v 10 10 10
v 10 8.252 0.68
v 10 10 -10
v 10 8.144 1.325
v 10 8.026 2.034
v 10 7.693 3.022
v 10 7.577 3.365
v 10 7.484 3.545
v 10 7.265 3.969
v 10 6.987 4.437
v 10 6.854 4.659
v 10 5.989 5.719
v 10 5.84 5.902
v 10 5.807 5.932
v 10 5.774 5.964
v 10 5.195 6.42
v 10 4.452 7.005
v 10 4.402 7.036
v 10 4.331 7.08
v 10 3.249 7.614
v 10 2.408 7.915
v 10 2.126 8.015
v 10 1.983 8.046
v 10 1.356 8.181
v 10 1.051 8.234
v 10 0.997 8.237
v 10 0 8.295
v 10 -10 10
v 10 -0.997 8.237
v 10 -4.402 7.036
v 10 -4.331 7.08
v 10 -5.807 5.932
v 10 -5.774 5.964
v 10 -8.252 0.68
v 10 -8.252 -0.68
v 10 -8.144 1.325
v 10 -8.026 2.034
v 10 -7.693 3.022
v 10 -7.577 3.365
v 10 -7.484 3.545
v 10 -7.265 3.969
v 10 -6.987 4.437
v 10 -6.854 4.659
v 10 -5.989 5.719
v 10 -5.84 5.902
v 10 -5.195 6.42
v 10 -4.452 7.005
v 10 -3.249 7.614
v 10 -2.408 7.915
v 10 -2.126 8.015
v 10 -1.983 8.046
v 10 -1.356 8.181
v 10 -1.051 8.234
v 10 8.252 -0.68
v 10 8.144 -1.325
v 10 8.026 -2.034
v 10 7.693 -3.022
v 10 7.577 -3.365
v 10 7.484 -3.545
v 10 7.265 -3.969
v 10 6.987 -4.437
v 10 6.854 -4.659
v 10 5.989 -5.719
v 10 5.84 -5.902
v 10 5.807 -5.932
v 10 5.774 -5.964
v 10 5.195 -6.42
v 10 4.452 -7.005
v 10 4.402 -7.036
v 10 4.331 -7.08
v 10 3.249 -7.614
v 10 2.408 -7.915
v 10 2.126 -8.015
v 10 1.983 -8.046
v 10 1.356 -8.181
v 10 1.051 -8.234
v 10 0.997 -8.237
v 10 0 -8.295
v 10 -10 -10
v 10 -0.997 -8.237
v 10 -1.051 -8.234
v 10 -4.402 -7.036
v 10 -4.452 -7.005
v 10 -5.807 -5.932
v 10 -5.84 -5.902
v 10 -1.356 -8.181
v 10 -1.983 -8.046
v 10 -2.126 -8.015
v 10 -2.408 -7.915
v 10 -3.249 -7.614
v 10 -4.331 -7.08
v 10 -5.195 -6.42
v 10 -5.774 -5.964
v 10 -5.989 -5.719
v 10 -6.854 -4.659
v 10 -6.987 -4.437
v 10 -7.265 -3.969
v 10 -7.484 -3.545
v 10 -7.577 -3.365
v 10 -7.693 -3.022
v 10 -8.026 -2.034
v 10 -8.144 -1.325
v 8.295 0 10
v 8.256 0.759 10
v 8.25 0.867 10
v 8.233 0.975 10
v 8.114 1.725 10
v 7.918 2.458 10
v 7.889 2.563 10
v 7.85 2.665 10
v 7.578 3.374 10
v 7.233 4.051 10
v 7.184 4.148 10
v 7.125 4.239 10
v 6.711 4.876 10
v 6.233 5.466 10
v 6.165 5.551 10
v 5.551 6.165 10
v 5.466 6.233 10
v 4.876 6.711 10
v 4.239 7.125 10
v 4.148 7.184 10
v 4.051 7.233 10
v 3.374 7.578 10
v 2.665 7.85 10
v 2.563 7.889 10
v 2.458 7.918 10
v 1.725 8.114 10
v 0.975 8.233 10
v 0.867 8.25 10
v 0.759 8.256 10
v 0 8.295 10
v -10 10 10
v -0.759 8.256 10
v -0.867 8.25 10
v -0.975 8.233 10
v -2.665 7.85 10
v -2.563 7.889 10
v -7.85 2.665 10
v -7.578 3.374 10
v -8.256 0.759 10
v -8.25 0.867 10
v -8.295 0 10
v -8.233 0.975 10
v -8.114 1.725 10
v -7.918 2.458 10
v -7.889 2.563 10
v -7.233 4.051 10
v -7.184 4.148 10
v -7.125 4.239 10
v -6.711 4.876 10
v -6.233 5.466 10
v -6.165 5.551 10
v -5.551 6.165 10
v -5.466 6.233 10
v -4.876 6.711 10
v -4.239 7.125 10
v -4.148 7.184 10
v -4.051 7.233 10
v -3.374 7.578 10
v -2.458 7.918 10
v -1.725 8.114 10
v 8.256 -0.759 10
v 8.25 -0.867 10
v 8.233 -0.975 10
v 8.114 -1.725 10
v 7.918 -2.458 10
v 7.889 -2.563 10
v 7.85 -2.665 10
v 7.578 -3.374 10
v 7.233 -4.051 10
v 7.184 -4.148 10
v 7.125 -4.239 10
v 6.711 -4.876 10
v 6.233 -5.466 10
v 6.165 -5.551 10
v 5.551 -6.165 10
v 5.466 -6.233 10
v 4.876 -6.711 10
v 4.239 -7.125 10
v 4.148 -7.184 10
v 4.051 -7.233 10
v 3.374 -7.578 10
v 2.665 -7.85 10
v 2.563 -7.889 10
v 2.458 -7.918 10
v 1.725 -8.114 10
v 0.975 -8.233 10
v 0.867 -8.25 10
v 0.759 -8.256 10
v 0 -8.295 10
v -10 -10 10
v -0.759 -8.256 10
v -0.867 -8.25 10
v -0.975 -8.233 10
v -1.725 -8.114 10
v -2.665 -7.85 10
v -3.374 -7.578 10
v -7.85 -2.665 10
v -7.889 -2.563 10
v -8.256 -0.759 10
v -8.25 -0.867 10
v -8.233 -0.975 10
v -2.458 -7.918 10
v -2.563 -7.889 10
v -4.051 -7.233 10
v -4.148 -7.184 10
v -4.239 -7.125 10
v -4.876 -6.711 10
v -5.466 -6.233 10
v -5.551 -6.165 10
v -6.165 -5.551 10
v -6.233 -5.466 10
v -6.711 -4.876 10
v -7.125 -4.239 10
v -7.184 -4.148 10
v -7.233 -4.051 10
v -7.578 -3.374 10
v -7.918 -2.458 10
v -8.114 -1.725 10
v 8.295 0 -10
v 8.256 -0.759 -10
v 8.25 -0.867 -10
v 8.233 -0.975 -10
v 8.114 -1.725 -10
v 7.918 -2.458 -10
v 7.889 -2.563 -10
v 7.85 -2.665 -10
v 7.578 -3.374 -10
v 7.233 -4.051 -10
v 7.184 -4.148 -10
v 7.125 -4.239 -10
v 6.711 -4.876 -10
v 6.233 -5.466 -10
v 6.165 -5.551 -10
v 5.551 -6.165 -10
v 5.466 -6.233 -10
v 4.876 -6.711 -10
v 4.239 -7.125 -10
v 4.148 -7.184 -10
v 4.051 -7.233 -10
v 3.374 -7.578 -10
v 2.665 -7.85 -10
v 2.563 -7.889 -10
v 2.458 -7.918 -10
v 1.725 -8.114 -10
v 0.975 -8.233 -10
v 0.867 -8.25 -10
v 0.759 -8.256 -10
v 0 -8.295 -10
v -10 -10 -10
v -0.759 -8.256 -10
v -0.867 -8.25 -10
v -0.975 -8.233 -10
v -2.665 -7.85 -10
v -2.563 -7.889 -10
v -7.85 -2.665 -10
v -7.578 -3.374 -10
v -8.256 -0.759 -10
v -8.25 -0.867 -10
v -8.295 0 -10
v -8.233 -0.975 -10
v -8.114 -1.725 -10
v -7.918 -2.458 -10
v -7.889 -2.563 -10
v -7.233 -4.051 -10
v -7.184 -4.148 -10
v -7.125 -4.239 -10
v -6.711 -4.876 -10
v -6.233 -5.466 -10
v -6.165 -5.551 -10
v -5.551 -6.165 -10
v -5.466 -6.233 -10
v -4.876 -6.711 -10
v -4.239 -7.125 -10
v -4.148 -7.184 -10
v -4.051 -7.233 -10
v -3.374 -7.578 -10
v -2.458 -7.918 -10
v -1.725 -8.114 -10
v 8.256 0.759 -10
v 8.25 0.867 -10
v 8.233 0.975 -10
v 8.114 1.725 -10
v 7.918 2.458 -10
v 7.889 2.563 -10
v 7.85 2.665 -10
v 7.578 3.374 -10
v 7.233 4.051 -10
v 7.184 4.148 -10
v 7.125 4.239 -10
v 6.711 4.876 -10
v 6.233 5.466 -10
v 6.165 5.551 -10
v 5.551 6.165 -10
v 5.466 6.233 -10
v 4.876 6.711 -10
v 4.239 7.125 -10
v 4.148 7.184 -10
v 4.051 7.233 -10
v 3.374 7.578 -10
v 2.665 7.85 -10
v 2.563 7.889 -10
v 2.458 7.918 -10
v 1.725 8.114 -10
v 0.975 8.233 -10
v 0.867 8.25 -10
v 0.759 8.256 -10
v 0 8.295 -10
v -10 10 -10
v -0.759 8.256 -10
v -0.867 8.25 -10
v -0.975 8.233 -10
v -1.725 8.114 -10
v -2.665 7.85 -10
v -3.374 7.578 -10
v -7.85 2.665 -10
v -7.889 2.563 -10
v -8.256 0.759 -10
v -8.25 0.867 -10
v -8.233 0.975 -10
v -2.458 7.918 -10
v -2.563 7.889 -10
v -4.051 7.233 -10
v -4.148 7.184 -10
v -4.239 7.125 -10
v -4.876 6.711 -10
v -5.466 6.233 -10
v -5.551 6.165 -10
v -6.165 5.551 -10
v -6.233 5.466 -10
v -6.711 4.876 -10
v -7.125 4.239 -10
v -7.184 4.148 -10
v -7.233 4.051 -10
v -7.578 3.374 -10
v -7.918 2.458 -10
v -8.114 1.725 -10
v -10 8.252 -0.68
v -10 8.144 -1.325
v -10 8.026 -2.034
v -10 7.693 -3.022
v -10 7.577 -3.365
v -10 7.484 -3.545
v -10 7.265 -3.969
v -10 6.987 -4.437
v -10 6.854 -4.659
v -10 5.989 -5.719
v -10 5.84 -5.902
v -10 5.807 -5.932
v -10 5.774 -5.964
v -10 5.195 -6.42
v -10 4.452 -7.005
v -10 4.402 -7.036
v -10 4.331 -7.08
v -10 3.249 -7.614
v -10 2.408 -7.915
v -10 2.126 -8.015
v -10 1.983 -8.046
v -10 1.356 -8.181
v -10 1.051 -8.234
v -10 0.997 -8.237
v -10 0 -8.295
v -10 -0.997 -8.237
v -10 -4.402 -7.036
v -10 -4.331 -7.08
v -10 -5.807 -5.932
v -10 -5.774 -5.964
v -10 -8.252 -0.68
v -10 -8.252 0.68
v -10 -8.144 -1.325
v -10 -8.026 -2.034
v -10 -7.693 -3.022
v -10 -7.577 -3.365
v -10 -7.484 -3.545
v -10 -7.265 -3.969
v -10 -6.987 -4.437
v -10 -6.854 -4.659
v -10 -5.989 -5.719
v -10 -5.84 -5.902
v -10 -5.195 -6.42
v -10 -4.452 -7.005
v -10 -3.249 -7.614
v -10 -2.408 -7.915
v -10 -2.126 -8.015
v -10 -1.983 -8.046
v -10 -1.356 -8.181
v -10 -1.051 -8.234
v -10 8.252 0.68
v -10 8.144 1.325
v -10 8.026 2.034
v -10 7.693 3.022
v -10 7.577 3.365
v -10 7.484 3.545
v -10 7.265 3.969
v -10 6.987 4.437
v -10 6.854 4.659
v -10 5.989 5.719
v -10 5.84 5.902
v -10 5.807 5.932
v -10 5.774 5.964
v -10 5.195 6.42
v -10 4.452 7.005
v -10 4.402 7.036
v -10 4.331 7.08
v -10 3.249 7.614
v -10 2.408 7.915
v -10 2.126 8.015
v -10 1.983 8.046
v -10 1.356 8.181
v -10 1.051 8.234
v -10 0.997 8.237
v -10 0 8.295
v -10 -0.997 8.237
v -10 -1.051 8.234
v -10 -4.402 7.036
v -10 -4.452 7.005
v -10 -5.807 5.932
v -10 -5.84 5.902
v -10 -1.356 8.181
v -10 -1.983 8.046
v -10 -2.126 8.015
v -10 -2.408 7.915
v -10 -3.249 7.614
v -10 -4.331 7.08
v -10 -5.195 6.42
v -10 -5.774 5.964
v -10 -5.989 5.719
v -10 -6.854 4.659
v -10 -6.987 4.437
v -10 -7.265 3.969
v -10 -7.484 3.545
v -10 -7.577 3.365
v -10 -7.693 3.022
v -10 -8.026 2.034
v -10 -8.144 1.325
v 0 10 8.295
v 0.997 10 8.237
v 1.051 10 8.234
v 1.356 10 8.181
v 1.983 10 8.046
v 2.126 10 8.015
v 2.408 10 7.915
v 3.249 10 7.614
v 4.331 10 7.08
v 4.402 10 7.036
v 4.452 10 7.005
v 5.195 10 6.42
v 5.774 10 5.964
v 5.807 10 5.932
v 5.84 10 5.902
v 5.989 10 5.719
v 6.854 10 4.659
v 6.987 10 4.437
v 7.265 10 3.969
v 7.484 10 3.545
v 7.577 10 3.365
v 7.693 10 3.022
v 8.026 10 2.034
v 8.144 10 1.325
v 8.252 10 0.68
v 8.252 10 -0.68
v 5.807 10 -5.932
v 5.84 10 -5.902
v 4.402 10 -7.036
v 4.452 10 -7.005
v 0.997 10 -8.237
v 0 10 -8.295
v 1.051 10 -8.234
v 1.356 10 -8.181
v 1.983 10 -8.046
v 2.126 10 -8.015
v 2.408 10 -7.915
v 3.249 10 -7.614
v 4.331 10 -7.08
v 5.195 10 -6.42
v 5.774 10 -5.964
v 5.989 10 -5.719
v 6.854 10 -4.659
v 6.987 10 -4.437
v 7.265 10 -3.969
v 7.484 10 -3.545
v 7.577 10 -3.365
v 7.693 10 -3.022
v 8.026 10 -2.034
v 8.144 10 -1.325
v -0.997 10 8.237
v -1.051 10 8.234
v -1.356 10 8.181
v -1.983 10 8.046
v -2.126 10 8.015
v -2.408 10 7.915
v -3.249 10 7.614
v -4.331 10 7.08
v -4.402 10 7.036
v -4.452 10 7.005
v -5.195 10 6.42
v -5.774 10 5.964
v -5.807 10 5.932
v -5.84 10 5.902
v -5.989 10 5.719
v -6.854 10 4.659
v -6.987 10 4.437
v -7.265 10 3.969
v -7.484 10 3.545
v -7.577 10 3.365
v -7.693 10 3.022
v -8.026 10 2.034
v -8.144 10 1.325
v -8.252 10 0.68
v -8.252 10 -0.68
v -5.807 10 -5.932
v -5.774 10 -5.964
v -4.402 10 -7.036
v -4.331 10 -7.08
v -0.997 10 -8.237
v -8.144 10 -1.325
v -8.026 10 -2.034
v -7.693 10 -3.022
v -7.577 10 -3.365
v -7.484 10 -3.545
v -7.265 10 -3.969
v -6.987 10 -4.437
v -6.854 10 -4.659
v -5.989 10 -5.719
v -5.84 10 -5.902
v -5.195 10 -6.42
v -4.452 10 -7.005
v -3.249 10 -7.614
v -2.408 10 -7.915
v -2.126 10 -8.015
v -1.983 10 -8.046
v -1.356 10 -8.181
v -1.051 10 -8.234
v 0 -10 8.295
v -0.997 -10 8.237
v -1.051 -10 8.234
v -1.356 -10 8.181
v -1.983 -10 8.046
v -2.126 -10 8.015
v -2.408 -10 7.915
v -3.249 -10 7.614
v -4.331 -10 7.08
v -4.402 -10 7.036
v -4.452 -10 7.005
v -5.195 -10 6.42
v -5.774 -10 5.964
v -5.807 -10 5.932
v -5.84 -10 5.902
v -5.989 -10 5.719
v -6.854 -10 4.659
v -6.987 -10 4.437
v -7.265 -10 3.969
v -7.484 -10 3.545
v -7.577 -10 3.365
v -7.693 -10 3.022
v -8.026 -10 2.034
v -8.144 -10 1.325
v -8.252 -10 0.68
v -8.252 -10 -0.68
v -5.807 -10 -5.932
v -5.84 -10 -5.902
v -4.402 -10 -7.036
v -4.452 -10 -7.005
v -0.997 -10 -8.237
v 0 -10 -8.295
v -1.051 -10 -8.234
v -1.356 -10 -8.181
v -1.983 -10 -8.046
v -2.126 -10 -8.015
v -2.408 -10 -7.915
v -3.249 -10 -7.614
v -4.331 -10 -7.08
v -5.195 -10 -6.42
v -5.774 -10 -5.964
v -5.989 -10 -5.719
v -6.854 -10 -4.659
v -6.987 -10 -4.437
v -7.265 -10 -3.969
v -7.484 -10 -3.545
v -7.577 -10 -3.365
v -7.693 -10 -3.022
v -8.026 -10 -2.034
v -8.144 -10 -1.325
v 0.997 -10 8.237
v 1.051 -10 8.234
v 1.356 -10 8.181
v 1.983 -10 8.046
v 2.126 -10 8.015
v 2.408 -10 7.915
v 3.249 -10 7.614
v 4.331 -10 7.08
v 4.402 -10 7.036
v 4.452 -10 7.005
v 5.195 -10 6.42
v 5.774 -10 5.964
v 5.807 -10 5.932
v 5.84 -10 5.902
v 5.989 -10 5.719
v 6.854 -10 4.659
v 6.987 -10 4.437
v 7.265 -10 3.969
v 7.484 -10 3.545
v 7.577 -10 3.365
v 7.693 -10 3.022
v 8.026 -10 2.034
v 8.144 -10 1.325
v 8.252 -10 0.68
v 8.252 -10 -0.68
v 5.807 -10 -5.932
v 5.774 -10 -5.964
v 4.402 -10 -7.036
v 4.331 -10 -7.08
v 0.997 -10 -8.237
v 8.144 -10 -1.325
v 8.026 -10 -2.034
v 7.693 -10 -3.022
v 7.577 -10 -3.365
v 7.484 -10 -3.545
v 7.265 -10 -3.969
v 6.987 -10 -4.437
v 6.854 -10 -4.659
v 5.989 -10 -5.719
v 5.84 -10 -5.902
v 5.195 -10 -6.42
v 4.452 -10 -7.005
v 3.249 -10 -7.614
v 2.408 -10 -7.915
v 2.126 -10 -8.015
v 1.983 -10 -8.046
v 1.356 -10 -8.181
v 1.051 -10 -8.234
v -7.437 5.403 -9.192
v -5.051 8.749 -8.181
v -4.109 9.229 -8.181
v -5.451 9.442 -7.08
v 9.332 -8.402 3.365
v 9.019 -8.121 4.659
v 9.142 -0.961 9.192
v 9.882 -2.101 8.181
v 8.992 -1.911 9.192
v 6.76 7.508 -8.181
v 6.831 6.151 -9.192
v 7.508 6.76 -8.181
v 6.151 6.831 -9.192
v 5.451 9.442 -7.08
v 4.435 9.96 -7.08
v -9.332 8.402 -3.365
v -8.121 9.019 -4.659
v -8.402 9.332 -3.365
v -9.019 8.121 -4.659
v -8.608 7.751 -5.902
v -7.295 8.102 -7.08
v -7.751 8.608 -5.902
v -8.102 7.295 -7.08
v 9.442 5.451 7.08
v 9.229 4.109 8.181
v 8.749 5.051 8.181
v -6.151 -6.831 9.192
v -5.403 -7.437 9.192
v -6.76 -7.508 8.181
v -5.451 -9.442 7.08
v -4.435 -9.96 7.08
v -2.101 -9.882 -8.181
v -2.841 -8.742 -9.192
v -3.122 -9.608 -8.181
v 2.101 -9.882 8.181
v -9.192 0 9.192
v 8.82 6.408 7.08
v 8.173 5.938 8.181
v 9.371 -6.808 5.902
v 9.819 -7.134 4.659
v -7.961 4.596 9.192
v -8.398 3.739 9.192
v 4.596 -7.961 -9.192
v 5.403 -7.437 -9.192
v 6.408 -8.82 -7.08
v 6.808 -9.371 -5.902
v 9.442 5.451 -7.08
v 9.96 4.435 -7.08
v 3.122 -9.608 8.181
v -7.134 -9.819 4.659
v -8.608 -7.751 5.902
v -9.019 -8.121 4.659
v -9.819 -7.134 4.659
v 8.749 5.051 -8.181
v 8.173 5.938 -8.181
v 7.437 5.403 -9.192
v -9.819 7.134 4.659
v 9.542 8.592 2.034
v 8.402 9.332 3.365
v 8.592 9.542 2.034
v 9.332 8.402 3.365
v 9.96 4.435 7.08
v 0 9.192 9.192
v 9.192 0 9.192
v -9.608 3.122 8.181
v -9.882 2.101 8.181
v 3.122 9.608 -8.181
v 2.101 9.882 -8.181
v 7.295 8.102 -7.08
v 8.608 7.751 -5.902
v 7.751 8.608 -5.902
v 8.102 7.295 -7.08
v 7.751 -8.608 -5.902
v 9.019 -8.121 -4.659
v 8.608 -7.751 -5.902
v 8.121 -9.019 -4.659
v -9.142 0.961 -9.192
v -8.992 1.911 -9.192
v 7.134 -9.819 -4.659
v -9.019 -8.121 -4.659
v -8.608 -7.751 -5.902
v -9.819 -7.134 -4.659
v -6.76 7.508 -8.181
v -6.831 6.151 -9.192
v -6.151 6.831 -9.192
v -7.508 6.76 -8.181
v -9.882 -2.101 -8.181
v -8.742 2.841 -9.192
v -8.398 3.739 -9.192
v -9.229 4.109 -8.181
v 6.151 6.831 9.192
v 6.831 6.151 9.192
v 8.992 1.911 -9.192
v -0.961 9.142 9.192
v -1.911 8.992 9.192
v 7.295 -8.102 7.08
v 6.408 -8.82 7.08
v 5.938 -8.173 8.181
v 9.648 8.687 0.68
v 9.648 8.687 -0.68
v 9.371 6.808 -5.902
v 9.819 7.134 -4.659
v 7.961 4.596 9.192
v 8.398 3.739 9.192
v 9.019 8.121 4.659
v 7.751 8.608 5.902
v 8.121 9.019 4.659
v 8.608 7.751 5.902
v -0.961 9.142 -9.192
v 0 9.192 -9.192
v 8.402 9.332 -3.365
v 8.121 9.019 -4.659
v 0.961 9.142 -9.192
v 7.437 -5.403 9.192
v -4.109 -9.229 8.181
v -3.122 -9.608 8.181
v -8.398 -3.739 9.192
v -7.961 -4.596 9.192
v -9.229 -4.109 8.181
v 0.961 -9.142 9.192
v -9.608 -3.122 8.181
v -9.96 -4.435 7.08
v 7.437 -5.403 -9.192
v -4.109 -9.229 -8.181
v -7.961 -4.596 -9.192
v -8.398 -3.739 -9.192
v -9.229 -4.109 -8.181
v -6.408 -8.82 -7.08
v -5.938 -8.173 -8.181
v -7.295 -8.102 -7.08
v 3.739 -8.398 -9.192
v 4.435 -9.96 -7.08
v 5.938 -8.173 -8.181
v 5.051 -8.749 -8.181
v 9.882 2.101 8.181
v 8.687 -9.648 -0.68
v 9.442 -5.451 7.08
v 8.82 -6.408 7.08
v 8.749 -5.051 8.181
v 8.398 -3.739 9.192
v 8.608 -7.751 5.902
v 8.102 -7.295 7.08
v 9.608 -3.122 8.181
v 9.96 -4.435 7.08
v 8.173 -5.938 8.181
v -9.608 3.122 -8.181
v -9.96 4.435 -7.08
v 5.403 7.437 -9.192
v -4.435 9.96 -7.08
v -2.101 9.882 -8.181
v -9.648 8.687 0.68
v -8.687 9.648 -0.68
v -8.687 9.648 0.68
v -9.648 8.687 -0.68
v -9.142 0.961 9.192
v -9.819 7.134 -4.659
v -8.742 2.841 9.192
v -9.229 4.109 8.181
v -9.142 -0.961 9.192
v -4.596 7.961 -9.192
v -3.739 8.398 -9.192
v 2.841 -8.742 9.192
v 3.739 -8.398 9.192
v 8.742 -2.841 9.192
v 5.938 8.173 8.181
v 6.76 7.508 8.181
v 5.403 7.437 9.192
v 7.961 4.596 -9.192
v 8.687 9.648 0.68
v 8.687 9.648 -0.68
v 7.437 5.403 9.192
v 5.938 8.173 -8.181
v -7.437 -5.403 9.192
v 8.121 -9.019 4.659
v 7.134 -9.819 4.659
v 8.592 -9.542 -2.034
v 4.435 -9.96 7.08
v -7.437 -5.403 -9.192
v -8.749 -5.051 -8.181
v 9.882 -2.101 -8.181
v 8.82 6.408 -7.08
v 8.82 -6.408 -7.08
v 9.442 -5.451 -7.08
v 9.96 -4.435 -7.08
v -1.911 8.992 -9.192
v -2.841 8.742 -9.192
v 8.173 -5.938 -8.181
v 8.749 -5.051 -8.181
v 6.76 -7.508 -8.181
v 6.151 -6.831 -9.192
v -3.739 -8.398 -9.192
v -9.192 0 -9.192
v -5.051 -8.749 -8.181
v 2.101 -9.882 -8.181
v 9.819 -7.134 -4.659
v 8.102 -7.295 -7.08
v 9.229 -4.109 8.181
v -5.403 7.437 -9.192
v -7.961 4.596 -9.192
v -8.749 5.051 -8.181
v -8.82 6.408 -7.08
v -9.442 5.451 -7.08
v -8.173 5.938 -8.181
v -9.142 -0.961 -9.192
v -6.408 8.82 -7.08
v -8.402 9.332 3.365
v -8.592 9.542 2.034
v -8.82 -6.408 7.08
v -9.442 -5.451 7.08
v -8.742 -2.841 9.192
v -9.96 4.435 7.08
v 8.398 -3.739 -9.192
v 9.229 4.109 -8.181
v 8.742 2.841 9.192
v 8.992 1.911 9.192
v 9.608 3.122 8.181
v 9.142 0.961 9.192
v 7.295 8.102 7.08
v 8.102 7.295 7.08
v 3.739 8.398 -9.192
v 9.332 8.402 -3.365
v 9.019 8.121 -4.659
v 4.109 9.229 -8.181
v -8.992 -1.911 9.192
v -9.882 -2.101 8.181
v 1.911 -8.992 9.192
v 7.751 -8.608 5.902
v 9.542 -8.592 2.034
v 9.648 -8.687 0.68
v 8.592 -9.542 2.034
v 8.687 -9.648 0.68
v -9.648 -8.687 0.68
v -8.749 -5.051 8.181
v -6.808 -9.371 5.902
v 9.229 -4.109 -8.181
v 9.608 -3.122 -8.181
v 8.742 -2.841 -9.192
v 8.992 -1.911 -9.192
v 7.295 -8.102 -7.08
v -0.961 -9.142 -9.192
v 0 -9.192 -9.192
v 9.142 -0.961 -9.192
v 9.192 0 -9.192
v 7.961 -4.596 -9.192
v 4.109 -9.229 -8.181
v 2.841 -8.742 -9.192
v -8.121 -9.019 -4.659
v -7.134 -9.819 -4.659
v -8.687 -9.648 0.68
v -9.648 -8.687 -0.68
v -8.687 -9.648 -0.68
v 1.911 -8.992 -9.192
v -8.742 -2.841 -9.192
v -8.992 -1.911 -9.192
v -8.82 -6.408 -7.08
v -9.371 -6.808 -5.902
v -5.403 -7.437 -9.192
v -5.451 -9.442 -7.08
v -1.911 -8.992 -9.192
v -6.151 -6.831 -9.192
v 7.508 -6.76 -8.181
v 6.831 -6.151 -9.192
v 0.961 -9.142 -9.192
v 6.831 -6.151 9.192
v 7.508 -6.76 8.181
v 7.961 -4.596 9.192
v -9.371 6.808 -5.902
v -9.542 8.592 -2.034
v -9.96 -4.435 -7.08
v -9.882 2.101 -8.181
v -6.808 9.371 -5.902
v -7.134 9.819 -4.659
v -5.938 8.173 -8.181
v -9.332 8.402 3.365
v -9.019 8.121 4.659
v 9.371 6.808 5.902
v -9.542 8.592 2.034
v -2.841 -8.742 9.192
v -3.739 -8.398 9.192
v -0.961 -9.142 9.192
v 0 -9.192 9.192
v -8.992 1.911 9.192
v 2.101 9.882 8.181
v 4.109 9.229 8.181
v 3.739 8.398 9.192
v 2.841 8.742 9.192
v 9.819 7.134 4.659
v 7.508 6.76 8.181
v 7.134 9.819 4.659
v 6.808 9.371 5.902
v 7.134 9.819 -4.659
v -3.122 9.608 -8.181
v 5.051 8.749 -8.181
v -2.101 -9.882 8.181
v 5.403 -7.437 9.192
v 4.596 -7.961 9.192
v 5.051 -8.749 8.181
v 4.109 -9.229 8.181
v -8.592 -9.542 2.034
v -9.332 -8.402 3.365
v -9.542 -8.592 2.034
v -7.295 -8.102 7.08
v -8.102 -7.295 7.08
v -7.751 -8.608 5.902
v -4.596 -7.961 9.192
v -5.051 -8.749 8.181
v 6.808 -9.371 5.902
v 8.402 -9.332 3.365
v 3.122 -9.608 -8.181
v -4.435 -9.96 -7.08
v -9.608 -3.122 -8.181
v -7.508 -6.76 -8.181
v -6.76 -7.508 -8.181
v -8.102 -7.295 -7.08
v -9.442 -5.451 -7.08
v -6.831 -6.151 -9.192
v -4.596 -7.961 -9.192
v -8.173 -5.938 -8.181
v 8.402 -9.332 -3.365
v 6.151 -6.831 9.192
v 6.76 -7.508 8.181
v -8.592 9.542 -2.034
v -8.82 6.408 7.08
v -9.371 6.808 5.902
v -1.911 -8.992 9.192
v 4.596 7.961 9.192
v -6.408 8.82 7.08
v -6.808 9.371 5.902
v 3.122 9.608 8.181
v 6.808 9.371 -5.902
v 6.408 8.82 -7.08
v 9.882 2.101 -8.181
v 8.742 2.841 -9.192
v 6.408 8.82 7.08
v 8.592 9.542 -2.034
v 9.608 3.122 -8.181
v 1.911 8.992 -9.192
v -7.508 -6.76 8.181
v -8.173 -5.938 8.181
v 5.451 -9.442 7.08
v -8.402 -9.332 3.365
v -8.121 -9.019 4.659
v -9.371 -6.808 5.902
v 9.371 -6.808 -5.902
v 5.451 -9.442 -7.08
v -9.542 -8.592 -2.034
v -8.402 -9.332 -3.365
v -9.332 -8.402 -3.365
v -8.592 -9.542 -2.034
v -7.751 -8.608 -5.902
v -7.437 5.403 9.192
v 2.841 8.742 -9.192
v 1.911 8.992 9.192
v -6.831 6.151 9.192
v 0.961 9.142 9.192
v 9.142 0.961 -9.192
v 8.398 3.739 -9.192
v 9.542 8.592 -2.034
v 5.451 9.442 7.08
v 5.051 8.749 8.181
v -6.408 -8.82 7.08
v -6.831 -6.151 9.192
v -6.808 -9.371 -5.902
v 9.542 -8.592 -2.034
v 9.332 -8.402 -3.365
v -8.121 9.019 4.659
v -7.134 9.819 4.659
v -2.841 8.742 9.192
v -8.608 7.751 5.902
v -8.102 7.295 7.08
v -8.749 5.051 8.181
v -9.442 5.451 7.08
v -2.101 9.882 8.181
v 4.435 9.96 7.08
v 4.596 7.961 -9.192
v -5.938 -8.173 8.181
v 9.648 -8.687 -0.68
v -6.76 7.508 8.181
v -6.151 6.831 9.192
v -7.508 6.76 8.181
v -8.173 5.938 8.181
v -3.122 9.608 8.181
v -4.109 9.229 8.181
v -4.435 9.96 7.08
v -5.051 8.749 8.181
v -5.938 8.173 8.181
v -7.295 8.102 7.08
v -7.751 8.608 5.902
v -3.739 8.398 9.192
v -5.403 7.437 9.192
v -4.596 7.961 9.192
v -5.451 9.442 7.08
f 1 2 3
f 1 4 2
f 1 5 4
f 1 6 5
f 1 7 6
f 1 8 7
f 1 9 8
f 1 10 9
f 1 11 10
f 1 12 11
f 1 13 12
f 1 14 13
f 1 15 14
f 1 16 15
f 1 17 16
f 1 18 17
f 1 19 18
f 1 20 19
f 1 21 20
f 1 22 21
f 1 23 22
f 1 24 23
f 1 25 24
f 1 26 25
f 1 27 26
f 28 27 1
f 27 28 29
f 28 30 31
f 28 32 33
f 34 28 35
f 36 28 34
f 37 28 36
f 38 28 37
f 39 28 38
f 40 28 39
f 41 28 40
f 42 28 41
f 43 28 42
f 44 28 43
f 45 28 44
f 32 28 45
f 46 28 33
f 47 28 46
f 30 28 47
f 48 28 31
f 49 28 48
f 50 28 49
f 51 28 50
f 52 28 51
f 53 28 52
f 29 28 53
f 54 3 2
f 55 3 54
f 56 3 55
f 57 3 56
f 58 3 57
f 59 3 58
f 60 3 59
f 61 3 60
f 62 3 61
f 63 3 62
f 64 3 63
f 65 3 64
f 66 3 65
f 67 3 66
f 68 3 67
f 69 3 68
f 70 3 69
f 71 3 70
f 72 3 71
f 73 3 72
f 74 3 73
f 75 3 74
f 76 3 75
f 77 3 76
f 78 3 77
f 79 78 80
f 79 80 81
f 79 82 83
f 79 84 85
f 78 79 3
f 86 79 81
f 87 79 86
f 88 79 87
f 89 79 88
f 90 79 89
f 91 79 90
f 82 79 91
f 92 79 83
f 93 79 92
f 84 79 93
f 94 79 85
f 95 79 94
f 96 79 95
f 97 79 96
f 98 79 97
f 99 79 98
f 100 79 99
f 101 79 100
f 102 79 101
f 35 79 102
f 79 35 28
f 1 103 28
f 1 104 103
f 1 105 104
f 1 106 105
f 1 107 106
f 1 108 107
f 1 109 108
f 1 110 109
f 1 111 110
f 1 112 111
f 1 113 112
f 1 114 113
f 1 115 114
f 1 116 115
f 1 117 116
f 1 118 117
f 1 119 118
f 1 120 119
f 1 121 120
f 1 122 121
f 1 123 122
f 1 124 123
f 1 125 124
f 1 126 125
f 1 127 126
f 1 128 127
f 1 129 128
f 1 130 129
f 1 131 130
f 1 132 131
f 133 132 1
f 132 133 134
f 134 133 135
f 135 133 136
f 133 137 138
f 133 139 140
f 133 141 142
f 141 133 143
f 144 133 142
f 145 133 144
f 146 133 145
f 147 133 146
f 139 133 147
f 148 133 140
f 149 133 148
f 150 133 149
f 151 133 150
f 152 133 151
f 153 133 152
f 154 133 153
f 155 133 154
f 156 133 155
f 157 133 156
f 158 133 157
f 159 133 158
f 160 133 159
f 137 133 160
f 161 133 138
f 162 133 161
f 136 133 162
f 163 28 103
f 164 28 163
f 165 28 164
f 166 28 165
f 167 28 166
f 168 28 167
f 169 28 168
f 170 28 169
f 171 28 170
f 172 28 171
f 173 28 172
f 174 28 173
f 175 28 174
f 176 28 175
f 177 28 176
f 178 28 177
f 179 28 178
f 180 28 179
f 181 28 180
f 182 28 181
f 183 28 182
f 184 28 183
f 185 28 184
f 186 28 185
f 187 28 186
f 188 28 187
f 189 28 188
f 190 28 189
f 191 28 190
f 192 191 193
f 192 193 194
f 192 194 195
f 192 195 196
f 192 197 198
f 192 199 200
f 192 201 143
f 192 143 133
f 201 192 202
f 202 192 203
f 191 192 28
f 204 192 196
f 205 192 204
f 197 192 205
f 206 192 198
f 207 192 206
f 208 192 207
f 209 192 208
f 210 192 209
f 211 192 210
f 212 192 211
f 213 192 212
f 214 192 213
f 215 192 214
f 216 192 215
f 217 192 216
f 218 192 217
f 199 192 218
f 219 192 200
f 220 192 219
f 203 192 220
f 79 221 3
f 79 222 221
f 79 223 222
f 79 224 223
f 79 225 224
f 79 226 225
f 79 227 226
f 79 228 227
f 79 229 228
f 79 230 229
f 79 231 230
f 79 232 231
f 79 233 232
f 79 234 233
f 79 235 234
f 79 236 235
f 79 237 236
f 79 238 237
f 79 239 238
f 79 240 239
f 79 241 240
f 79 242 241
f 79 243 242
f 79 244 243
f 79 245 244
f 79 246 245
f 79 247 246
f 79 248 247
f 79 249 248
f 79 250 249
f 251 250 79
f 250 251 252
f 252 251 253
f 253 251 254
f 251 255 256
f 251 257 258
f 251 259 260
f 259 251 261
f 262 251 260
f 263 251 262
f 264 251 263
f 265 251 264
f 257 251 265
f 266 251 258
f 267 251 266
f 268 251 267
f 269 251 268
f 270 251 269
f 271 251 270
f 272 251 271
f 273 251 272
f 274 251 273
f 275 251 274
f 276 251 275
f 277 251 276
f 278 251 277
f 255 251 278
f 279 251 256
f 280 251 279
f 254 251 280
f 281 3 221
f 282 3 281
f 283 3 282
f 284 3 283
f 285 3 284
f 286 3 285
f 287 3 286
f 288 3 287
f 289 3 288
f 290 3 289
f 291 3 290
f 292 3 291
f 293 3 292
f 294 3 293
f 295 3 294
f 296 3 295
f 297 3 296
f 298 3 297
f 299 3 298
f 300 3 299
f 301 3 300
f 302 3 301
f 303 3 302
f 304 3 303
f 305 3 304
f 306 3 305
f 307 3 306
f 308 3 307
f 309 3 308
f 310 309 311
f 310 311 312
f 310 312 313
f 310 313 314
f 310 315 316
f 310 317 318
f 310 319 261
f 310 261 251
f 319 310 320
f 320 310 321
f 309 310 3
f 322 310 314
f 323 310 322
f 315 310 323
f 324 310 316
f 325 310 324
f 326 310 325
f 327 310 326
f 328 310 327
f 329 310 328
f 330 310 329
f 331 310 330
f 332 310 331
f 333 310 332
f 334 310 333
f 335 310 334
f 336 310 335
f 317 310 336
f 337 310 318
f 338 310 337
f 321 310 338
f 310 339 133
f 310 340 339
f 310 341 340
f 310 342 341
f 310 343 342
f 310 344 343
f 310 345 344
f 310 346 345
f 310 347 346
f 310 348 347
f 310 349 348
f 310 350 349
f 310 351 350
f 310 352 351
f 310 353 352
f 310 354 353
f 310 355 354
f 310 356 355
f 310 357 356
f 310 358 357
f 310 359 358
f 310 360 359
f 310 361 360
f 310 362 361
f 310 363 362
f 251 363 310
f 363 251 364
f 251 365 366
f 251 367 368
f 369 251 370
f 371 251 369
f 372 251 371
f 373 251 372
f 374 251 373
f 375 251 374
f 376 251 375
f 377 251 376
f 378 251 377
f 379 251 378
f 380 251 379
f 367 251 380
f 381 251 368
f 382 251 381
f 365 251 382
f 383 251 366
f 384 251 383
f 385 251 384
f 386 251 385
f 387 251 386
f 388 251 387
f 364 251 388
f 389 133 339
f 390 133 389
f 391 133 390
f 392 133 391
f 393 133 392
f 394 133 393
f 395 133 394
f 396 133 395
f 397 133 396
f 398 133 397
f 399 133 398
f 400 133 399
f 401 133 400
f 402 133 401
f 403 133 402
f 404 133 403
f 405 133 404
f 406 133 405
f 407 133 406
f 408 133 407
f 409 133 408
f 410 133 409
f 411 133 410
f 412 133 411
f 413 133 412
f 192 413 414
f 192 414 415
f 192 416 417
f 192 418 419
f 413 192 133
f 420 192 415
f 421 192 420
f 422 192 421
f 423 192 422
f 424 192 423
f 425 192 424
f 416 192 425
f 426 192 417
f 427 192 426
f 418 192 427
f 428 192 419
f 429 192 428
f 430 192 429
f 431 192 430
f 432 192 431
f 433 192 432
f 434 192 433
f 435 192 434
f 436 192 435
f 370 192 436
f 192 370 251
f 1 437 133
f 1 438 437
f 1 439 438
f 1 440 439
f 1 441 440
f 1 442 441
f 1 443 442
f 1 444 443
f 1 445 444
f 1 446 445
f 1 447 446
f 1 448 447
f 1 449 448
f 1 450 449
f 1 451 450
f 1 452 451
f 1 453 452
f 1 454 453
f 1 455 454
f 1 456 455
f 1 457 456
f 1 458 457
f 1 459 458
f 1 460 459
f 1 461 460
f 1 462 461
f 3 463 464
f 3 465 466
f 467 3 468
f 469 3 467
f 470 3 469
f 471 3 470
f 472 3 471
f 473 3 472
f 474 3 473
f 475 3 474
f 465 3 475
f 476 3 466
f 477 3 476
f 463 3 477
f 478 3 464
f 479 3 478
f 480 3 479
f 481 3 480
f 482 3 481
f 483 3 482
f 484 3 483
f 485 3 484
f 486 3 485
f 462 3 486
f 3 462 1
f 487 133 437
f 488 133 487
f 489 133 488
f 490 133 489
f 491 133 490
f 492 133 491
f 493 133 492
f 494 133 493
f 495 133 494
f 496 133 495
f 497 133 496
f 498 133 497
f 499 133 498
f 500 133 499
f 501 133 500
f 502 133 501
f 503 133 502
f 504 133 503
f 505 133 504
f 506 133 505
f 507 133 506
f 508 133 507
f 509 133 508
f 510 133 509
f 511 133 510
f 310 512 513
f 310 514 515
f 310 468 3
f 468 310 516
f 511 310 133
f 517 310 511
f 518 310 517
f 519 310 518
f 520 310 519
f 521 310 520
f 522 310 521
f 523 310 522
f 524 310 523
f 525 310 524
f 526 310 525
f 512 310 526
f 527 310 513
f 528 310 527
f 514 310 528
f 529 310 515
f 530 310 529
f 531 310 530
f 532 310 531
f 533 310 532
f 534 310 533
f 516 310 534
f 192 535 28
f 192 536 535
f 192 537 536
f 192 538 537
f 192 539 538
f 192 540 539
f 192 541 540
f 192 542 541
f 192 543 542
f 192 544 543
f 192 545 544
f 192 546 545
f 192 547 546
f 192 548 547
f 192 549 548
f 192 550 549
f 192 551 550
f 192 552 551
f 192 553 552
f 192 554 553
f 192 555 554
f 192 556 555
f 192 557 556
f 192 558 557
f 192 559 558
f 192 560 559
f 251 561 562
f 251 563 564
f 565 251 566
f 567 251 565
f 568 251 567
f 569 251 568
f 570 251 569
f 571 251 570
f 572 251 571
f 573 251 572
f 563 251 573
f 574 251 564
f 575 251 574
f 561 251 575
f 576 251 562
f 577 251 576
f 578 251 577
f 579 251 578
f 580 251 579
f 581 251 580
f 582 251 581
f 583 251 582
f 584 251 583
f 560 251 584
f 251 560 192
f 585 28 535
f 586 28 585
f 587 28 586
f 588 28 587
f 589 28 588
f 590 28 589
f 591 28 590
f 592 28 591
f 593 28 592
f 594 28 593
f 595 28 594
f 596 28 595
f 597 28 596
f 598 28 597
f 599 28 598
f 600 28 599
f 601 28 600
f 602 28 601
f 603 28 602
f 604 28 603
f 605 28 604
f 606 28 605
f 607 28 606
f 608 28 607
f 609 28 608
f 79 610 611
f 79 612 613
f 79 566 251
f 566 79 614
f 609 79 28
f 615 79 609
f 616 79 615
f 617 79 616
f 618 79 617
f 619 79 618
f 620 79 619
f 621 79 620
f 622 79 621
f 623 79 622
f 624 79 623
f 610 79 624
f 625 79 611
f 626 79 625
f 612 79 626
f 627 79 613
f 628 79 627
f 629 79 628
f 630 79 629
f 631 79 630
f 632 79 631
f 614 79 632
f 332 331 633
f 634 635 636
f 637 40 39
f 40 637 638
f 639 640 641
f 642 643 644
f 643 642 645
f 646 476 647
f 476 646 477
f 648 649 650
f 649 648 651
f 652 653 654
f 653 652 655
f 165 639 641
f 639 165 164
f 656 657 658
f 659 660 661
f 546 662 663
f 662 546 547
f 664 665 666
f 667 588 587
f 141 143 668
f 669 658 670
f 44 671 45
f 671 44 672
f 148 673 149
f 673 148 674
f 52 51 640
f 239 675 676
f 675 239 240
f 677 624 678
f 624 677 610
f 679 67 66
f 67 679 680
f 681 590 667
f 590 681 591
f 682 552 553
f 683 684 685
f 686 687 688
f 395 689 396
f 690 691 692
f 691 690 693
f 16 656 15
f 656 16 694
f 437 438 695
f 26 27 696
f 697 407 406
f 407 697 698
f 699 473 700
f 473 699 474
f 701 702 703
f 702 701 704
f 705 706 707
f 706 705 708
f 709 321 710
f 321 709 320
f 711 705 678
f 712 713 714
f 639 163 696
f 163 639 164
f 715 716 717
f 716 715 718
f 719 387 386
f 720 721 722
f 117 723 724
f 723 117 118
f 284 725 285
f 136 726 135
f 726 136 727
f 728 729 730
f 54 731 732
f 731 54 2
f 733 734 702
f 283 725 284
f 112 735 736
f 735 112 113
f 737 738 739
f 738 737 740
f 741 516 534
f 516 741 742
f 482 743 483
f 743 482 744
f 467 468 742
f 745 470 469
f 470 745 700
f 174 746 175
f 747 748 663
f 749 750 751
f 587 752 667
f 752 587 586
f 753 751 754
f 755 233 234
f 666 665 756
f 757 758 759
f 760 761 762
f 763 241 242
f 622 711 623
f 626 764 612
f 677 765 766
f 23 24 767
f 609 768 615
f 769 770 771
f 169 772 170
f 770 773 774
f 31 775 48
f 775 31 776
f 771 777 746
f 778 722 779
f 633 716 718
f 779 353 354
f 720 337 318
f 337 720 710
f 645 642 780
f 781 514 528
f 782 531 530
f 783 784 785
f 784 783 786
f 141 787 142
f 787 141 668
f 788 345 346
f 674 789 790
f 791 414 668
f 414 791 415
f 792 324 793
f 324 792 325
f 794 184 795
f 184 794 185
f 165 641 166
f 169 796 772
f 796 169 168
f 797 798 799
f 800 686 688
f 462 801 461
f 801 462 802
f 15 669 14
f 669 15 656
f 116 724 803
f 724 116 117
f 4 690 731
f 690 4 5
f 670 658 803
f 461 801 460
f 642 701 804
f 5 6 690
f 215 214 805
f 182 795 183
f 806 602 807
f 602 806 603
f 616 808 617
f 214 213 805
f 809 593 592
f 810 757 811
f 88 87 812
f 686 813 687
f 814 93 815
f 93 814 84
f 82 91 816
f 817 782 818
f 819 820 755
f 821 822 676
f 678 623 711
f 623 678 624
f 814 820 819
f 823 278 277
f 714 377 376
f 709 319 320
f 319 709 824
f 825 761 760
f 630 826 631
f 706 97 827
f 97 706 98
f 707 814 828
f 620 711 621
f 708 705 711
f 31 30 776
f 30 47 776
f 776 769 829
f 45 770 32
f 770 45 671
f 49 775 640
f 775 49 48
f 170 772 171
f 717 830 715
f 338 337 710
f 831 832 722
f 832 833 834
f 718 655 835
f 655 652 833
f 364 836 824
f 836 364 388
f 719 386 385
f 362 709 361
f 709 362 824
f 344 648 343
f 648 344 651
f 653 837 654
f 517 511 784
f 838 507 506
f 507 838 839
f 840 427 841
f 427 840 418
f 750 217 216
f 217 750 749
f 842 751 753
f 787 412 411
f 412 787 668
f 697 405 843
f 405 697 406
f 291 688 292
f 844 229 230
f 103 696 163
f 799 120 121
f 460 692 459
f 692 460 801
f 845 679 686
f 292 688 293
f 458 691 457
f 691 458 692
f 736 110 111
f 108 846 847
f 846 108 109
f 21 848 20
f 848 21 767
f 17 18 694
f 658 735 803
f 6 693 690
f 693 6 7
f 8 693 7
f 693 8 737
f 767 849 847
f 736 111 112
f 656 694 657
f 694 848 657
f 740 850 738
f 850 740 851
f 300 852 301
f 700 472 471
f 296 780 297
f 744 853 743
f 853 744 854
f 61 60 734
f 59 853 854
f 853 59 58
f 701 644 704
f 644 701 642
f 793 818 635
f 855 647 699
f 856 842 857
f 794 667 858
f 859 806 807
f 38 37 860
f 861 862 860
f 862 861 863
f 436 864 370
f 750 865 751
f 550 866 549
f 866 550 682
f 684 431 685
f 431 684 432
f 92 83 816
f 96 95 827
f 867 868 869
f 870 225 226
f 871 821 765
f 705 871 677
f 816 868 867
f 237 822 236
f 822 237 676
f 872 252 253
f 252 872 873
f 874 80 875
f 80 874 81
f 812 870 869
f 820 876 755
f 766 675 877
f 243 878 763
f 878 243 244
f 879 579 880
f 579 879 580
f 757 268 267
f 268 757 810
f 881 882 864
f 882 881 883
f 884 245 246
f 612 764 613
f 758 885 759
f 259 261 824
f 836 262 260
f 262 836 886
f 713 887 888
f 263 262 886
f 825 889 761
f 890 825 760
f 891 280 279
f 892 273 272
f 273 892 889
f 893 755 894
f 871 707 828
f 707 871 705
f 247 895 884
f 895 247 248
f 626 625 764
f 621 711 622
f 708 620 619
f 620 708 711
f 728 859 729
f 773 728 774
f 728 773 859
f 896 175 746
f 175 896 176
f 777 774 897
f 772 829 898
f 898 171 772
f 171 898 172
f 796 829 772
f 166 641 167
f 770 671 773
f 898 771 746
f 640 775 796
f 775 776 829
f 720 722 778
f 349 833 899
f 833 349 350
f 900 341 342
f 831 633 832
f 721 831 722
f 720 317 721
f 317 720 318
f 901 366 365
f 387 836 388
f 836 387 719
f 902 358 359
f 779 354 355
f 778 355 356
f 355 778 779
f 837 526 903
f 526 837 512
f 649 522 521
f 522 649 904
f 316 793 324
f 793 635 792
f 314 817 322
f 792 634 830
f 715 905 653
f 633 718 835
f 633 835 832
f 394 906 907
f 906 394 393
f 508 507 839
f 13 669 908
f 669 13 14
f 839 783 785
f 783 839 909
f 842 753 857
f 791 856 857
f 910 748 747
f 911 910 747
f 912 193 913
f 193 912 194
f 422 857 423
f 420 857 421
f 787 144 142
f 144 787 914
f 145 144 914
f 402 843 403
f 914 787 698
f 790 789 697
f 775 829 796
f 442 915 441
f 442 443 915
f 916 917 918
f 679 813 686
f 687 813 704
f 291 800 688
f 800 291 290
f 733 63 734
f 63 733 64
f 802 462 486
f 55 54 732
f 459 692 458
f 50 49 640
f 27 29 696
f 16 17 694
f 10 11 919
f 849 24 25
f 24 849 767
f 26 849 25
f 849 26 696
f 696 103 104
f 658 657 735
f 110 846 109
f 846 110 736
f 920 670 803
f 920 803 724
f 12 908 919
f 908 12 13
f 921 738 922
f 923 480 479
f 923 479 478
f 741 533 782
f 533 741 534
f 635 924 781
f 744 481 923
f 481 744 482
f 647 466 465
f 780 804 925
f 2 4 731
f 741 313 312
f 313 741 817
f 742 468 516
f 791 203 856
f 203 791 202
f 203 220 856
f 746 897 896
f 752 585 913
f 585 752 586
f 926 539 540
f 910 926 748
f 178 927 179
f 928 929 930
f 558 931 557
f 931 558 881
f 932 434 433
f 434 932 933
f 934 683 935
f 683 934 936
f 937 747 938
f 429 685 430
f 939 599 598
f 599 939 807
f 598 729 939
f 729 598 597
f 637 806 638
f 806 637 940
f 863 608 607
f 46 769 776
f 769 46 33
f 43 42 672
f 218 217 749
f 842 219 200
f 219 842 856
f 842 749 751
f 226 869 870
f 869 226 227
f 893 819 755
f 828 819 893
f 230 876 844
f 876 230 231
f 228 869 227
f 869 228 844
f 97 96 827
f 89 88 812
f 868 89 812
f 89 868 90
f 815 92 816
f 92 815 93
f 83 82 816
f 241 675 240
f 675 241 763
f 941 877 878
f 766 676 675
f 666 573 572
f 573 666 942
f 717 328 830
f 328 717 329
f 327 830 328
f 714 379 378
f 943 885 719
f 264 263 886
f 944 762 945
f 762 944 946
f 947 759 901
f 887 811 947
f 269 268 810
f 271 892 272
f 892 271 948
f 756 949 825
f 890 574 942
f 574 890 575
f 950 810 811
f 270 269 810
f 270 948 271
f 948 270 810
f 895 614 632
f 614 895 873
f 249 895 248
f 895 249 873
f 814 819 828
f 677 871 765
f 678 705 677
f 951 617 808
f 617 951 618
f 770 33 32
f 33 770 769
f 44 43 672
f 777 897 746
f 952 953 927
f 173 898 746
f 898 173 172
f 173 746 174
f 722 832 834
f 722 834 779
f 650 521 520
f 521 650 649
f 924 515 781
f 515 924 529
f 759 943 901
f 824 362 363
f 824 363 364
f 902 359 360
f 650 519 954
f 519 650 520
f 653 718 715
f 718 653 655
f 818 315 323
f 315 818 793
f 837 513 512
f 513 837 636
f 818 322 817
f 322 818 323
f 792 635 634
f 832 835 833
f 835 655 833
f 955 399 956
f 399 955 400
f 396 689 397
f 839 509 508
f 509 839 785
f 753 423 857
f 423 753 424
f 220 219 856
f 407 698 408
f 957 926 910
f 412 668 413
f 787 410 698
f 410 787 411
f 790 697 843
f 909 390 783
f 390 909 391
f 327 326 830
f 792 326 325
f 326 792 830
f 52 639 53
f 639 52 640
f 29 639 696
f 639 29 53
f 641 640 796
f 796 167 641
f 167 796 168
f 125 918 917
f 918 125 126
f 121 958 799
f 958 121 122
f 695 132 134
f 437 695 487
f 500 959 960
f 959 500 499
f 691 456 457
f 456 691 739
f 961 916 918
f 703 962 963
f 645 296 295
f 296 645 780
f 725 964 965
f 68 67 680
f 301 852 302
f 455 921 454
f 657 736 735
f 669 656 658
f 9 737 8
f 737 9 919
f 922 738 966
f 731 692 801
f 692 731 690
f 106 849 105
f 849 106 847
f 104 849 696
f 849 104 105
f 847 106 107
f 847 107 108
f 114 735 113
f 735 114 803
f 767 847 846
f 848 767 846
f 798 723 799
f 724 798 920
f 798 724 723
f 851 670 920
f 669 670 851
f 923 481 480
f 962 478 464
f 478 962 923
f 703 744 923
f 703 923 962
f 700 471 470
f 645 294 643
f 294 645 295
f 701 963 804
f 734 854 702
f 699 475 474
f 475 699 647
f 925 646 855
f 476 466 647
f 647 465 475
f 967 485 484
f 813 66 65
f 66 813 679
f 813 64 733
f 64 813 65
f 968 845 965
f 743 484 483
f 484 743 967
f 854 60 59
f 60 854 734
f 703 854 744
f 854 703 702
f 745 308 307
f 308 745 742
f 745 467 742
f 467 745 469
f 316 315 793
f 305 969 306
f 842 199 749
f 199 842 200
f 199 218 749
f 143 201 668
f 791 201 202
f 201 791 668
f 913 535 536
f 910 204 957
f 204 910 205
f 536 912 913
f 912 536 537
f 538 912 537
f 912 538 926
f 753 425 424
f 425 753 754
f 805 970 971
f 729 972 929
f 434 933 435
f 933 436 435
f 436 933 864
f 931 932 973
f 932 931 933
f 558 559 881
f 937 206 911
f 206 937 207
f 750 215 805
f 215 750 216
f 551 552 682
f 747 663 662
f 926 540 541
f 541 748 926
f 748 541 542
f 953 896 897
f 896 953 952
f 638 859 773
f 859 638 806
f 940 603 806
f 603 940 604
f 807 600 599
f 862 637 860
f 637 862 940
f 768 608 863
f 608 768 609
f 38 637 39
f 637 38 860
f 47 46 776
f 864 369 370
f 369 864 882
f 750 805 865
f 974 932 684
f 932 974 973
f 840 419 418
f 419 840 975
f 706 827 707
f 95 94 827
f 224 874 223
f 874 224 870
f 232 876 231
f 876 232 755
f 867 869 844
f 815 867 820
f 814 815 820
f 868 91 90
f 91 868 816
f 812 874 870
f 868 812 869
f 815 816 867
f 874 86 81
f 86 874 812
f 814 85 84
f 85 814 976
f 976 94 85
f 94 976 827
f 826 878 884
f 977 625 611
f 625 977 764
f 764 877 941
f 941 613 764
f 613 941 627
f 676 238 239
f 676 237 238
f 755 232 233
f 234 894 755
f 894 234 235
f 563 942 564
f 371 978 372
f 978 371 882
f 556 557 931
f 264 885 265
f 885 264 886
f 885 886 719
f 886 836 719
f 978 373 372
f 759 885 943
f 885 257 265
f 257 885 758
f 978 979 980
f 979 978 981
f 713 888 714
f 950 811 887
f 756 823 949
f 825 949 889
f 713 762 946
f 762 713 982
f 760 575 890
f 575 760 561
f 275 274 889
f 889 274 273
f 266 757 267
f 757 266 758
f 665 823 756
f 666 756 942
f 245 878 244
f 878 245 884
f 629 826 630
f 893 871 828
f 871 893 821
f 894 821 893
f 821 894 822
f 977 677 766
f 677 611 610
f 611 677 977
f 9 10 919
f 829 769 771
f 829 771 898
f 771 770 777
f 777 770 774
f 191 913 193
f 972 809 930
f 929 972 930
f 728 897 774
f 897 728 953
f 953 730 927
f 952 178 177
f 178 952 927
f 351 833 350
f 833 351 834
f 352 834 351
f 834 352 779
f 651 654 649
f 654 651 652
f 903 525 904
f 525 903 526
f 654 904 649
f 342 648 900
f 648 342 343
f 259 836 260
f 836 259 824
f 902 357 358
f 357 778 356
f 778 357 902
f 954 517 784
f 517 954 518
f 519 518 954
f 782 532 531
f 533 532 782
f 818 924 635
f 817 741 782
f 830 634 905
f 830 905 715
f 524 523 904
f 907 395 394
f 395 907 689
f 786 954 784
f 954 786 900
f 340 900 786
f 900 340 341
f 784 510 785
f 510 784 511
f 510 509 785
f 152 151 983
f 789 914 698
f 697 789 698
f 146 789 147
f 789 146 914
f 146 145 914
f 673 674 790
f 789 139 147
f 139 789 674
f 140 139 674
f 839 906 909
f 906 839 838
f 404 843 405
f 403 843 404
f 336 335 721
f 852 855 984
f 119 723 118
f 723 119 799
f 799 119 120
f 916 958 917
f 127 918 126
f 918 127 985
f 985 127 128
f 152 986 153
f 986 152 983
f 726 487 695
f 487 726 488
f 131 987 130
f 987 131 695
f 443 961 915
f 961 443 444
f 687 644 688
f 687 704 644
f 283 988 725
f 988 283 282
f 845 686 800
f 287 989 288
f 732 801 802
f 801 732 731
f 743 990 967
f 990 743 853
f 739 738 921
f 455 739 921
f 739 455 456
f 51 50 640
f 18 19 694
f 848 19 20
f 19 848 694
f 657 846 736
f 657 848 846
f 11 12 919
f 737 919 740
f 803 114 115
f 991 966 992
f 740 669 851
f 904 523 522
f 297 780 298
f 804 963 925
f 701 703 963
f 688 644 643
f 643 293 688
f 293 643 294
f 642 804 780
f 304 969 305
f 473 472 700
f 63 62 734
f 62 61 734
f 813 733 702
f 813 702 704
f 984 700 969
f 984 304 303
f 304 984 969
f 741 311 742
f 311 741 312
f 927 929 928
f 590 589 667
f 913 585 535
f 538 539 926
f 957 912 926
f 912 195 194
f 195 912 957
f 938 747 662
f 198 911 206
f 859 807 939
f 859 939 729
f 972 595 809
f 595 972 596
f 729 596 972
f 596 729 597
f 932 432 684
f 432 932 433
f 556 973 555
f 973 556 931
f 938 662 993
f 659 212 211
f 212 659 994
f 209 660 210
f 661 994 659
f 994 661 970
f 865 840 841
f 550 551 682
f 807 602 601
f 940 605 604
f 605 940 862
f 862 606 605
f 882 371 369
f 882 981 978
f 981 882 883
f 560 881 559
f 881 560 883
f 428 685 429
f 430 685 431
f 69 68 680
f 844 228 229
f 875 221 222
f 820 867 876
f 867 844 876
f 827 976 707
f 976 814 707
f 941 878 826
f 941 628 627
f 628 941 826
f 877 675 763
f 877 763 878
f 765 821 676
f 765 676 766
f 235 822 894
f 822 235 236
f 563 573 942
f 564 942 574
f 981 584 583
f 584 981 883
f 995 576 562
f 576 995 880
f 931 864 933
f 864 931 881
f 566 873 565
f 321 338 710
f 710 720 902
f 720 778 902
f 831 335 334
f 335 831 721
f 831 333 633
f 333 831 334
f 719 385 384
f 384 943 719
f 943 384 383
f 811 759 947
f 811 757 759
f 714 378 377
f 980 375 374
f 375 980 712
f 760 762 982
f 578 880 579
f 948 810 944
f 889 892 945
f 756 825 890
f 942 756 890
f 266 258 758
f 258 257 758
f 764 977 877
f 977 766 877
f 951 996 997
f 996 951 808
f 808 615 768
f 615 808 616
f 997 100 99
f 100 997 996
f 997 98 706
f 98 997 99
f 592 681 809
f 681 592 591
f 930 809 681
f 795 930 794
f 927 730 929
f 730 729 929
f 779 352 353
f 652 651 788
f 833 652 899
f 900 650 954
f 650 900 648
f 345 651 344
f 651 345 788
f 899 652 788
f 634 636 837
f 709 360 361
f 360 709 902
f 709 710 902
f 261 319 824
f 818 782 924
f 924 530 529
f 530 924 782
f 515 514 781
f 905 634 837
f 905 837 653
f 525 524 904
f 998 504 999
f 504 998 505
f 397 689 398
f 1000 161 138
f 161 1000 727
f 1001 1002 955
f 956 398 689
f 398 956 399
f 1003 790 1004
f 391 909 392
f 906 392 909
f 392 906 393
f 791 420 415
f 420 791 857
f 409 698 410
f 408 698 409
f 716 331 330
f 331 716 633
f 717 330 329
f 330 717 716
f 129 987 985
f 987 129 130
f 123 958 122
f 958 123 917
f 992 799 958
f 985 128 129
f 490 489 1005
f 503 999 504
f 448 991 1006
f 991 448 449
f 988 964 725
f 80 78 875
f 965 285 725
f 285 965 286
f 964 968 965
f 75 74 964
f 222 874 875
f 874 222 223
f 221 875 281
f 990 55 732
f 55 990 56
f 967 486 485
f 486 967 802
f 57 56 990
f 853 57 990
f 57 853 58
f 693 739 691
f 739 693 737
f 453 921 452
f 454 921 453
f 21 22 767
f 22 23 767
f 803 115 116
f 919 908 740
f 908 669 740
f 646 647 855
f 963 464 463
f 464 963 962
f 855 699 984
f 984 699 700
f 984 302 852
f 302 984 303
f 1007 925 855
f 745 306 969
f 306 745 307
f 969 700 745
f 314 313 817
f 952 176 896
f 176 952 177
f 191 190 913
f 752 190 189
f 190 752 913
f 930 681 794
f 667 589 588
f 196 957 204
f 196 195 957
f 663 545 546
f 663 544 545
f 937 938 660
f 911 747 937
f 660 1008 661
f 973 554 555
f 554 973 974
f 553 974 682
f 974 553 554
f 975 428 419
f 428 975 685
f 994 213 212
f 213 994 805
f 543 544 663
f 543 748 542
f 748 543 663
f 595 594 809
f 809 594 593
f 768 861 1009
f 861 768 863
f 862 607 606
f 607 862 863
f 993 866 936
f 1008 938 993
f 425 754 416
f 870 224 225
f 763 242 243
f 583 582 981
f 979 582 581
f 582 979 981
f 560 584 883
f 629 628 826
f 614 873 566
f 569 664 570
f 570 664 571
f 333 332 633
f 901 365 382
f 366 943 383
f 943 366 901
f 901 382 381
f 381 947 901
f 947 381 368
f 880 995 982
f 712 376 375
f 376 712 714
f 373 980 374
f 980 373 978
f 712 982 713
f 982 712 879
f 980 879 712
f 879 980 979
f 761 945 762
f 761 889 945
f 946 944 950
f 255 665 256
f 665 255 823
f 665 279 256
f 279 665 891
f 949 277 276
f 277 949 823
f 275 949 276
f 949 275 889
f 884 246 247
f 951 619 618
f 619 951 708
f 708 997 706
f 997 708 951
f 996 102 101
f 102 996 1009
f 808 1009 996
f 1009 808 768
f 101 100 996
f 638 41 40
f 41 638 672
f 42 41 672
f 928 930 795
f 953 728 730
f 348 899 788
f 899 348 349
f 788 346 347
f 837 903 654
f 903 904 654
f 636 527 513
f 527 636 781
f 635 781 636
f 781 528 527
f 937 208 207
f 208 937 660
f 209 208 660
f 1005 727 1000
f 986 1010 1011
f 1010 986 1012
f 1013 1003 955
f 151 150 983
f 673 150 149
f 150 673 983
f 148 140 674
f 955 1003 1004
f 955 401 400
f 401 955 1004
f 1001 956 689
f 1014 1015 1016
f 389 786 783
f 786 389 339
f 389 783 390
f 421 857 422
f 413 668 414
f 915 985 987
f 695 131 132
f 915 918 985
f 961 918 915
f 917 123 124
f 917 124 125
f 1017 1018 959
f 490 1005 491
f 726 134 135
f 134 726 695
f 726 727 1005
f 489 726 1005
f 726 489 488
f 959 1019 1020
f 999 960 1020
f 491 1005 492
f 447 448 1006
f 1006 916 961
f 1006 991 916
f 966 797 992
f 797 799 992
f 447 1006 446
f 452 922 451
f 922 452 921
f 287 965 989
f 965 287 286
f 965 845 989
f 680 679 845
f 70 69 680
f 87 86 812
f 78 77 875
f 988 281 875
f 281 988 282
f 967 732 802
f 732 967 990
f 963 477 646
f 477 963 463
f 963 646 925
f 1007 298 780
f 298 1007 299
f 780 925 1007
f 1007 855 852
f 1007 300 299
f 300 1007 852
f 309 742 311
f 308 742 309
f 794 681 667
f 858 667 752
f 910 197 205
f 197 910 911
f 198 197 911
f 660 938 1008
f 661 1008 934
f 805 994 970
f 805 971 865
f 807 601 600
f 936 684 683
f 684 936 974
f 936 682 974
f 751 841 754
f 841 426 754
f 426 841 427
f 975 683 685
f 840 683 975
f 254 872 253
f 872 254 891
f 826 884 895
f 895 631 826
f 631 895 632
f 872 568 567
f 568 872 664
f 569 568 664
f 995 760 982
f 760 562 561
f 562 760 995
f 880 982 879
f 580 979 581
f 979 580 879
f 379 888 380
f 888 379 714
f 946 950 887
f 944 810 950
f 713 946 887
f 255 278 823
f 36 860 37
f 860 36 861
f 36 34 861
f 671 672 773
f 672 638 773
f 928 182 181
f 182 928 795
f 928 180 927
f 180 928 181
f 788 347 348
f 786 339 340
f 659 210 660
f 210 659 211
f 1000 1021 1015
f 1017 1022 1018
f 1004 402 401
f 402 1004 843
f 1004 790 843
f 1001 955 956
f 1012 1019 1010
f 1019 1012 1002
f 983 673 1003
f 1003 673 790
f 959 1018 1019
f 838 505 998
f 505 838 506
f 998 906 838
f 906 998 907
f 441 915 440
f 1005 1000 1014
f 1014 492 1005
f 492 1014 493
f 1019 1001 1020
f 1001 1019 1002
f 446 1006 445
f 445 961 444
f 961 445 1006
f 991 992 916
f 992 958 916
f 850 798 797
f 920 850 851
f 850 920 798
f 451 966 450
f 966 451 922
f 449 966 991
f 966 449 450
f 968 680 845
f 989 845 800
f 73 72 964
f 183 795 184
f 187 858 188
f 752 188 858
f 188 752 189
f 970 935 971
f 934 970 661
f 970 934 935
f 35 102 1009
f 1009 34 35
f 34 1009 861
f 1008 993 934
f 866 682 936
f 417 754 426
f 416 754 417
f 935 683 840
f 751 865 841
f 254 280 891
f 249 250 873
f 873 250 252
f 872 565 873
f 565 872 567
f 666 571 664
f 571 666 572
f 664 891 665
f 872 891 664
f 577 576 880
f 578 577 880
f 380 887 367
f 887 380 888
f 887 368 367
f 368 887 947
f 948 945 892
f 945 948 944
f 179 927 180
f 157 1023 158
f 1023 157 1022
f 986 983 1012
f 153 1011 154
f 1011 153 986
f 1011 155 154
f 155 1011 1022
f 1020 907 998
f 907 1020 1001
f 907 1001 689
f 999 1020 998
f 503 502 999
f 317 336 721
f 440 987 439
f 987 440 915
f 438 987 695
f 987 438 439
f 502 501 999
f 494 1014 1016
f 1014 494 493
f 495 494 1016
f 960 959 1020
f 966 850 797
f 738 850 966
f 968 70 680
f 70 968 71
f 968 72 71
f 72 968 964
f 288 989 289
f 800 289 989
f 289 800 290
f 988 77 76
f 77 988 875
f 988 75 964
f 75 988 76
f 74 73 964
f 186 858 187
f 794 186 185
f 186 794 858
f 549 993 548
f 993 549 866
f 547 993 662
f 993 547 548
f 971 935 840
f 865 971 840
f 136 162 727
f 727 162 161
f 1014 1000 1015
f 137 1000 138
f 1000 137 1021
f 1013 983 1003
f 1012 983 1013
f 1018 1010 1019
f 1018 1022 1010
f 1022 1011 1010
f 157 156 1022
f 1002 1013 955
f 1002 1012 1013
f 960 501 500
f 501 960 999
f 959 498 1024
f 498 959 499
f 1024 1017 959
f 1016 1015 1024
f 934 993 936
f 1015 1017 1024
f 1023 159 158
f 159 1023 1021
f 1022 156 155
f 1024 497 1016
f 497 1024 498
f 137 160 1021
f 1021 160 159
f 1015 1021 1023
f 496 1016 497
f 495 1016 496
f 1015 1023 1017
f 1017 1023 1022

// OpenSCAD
// A simple OpenSCAD script for testing the renderer
$fn = 60; // Smoothness parameter

difference() {
    // Outer cube
    cube([20, 20, 20], center = true);
    // Inner sphere cut-out
    sphere(r = 13);
}
